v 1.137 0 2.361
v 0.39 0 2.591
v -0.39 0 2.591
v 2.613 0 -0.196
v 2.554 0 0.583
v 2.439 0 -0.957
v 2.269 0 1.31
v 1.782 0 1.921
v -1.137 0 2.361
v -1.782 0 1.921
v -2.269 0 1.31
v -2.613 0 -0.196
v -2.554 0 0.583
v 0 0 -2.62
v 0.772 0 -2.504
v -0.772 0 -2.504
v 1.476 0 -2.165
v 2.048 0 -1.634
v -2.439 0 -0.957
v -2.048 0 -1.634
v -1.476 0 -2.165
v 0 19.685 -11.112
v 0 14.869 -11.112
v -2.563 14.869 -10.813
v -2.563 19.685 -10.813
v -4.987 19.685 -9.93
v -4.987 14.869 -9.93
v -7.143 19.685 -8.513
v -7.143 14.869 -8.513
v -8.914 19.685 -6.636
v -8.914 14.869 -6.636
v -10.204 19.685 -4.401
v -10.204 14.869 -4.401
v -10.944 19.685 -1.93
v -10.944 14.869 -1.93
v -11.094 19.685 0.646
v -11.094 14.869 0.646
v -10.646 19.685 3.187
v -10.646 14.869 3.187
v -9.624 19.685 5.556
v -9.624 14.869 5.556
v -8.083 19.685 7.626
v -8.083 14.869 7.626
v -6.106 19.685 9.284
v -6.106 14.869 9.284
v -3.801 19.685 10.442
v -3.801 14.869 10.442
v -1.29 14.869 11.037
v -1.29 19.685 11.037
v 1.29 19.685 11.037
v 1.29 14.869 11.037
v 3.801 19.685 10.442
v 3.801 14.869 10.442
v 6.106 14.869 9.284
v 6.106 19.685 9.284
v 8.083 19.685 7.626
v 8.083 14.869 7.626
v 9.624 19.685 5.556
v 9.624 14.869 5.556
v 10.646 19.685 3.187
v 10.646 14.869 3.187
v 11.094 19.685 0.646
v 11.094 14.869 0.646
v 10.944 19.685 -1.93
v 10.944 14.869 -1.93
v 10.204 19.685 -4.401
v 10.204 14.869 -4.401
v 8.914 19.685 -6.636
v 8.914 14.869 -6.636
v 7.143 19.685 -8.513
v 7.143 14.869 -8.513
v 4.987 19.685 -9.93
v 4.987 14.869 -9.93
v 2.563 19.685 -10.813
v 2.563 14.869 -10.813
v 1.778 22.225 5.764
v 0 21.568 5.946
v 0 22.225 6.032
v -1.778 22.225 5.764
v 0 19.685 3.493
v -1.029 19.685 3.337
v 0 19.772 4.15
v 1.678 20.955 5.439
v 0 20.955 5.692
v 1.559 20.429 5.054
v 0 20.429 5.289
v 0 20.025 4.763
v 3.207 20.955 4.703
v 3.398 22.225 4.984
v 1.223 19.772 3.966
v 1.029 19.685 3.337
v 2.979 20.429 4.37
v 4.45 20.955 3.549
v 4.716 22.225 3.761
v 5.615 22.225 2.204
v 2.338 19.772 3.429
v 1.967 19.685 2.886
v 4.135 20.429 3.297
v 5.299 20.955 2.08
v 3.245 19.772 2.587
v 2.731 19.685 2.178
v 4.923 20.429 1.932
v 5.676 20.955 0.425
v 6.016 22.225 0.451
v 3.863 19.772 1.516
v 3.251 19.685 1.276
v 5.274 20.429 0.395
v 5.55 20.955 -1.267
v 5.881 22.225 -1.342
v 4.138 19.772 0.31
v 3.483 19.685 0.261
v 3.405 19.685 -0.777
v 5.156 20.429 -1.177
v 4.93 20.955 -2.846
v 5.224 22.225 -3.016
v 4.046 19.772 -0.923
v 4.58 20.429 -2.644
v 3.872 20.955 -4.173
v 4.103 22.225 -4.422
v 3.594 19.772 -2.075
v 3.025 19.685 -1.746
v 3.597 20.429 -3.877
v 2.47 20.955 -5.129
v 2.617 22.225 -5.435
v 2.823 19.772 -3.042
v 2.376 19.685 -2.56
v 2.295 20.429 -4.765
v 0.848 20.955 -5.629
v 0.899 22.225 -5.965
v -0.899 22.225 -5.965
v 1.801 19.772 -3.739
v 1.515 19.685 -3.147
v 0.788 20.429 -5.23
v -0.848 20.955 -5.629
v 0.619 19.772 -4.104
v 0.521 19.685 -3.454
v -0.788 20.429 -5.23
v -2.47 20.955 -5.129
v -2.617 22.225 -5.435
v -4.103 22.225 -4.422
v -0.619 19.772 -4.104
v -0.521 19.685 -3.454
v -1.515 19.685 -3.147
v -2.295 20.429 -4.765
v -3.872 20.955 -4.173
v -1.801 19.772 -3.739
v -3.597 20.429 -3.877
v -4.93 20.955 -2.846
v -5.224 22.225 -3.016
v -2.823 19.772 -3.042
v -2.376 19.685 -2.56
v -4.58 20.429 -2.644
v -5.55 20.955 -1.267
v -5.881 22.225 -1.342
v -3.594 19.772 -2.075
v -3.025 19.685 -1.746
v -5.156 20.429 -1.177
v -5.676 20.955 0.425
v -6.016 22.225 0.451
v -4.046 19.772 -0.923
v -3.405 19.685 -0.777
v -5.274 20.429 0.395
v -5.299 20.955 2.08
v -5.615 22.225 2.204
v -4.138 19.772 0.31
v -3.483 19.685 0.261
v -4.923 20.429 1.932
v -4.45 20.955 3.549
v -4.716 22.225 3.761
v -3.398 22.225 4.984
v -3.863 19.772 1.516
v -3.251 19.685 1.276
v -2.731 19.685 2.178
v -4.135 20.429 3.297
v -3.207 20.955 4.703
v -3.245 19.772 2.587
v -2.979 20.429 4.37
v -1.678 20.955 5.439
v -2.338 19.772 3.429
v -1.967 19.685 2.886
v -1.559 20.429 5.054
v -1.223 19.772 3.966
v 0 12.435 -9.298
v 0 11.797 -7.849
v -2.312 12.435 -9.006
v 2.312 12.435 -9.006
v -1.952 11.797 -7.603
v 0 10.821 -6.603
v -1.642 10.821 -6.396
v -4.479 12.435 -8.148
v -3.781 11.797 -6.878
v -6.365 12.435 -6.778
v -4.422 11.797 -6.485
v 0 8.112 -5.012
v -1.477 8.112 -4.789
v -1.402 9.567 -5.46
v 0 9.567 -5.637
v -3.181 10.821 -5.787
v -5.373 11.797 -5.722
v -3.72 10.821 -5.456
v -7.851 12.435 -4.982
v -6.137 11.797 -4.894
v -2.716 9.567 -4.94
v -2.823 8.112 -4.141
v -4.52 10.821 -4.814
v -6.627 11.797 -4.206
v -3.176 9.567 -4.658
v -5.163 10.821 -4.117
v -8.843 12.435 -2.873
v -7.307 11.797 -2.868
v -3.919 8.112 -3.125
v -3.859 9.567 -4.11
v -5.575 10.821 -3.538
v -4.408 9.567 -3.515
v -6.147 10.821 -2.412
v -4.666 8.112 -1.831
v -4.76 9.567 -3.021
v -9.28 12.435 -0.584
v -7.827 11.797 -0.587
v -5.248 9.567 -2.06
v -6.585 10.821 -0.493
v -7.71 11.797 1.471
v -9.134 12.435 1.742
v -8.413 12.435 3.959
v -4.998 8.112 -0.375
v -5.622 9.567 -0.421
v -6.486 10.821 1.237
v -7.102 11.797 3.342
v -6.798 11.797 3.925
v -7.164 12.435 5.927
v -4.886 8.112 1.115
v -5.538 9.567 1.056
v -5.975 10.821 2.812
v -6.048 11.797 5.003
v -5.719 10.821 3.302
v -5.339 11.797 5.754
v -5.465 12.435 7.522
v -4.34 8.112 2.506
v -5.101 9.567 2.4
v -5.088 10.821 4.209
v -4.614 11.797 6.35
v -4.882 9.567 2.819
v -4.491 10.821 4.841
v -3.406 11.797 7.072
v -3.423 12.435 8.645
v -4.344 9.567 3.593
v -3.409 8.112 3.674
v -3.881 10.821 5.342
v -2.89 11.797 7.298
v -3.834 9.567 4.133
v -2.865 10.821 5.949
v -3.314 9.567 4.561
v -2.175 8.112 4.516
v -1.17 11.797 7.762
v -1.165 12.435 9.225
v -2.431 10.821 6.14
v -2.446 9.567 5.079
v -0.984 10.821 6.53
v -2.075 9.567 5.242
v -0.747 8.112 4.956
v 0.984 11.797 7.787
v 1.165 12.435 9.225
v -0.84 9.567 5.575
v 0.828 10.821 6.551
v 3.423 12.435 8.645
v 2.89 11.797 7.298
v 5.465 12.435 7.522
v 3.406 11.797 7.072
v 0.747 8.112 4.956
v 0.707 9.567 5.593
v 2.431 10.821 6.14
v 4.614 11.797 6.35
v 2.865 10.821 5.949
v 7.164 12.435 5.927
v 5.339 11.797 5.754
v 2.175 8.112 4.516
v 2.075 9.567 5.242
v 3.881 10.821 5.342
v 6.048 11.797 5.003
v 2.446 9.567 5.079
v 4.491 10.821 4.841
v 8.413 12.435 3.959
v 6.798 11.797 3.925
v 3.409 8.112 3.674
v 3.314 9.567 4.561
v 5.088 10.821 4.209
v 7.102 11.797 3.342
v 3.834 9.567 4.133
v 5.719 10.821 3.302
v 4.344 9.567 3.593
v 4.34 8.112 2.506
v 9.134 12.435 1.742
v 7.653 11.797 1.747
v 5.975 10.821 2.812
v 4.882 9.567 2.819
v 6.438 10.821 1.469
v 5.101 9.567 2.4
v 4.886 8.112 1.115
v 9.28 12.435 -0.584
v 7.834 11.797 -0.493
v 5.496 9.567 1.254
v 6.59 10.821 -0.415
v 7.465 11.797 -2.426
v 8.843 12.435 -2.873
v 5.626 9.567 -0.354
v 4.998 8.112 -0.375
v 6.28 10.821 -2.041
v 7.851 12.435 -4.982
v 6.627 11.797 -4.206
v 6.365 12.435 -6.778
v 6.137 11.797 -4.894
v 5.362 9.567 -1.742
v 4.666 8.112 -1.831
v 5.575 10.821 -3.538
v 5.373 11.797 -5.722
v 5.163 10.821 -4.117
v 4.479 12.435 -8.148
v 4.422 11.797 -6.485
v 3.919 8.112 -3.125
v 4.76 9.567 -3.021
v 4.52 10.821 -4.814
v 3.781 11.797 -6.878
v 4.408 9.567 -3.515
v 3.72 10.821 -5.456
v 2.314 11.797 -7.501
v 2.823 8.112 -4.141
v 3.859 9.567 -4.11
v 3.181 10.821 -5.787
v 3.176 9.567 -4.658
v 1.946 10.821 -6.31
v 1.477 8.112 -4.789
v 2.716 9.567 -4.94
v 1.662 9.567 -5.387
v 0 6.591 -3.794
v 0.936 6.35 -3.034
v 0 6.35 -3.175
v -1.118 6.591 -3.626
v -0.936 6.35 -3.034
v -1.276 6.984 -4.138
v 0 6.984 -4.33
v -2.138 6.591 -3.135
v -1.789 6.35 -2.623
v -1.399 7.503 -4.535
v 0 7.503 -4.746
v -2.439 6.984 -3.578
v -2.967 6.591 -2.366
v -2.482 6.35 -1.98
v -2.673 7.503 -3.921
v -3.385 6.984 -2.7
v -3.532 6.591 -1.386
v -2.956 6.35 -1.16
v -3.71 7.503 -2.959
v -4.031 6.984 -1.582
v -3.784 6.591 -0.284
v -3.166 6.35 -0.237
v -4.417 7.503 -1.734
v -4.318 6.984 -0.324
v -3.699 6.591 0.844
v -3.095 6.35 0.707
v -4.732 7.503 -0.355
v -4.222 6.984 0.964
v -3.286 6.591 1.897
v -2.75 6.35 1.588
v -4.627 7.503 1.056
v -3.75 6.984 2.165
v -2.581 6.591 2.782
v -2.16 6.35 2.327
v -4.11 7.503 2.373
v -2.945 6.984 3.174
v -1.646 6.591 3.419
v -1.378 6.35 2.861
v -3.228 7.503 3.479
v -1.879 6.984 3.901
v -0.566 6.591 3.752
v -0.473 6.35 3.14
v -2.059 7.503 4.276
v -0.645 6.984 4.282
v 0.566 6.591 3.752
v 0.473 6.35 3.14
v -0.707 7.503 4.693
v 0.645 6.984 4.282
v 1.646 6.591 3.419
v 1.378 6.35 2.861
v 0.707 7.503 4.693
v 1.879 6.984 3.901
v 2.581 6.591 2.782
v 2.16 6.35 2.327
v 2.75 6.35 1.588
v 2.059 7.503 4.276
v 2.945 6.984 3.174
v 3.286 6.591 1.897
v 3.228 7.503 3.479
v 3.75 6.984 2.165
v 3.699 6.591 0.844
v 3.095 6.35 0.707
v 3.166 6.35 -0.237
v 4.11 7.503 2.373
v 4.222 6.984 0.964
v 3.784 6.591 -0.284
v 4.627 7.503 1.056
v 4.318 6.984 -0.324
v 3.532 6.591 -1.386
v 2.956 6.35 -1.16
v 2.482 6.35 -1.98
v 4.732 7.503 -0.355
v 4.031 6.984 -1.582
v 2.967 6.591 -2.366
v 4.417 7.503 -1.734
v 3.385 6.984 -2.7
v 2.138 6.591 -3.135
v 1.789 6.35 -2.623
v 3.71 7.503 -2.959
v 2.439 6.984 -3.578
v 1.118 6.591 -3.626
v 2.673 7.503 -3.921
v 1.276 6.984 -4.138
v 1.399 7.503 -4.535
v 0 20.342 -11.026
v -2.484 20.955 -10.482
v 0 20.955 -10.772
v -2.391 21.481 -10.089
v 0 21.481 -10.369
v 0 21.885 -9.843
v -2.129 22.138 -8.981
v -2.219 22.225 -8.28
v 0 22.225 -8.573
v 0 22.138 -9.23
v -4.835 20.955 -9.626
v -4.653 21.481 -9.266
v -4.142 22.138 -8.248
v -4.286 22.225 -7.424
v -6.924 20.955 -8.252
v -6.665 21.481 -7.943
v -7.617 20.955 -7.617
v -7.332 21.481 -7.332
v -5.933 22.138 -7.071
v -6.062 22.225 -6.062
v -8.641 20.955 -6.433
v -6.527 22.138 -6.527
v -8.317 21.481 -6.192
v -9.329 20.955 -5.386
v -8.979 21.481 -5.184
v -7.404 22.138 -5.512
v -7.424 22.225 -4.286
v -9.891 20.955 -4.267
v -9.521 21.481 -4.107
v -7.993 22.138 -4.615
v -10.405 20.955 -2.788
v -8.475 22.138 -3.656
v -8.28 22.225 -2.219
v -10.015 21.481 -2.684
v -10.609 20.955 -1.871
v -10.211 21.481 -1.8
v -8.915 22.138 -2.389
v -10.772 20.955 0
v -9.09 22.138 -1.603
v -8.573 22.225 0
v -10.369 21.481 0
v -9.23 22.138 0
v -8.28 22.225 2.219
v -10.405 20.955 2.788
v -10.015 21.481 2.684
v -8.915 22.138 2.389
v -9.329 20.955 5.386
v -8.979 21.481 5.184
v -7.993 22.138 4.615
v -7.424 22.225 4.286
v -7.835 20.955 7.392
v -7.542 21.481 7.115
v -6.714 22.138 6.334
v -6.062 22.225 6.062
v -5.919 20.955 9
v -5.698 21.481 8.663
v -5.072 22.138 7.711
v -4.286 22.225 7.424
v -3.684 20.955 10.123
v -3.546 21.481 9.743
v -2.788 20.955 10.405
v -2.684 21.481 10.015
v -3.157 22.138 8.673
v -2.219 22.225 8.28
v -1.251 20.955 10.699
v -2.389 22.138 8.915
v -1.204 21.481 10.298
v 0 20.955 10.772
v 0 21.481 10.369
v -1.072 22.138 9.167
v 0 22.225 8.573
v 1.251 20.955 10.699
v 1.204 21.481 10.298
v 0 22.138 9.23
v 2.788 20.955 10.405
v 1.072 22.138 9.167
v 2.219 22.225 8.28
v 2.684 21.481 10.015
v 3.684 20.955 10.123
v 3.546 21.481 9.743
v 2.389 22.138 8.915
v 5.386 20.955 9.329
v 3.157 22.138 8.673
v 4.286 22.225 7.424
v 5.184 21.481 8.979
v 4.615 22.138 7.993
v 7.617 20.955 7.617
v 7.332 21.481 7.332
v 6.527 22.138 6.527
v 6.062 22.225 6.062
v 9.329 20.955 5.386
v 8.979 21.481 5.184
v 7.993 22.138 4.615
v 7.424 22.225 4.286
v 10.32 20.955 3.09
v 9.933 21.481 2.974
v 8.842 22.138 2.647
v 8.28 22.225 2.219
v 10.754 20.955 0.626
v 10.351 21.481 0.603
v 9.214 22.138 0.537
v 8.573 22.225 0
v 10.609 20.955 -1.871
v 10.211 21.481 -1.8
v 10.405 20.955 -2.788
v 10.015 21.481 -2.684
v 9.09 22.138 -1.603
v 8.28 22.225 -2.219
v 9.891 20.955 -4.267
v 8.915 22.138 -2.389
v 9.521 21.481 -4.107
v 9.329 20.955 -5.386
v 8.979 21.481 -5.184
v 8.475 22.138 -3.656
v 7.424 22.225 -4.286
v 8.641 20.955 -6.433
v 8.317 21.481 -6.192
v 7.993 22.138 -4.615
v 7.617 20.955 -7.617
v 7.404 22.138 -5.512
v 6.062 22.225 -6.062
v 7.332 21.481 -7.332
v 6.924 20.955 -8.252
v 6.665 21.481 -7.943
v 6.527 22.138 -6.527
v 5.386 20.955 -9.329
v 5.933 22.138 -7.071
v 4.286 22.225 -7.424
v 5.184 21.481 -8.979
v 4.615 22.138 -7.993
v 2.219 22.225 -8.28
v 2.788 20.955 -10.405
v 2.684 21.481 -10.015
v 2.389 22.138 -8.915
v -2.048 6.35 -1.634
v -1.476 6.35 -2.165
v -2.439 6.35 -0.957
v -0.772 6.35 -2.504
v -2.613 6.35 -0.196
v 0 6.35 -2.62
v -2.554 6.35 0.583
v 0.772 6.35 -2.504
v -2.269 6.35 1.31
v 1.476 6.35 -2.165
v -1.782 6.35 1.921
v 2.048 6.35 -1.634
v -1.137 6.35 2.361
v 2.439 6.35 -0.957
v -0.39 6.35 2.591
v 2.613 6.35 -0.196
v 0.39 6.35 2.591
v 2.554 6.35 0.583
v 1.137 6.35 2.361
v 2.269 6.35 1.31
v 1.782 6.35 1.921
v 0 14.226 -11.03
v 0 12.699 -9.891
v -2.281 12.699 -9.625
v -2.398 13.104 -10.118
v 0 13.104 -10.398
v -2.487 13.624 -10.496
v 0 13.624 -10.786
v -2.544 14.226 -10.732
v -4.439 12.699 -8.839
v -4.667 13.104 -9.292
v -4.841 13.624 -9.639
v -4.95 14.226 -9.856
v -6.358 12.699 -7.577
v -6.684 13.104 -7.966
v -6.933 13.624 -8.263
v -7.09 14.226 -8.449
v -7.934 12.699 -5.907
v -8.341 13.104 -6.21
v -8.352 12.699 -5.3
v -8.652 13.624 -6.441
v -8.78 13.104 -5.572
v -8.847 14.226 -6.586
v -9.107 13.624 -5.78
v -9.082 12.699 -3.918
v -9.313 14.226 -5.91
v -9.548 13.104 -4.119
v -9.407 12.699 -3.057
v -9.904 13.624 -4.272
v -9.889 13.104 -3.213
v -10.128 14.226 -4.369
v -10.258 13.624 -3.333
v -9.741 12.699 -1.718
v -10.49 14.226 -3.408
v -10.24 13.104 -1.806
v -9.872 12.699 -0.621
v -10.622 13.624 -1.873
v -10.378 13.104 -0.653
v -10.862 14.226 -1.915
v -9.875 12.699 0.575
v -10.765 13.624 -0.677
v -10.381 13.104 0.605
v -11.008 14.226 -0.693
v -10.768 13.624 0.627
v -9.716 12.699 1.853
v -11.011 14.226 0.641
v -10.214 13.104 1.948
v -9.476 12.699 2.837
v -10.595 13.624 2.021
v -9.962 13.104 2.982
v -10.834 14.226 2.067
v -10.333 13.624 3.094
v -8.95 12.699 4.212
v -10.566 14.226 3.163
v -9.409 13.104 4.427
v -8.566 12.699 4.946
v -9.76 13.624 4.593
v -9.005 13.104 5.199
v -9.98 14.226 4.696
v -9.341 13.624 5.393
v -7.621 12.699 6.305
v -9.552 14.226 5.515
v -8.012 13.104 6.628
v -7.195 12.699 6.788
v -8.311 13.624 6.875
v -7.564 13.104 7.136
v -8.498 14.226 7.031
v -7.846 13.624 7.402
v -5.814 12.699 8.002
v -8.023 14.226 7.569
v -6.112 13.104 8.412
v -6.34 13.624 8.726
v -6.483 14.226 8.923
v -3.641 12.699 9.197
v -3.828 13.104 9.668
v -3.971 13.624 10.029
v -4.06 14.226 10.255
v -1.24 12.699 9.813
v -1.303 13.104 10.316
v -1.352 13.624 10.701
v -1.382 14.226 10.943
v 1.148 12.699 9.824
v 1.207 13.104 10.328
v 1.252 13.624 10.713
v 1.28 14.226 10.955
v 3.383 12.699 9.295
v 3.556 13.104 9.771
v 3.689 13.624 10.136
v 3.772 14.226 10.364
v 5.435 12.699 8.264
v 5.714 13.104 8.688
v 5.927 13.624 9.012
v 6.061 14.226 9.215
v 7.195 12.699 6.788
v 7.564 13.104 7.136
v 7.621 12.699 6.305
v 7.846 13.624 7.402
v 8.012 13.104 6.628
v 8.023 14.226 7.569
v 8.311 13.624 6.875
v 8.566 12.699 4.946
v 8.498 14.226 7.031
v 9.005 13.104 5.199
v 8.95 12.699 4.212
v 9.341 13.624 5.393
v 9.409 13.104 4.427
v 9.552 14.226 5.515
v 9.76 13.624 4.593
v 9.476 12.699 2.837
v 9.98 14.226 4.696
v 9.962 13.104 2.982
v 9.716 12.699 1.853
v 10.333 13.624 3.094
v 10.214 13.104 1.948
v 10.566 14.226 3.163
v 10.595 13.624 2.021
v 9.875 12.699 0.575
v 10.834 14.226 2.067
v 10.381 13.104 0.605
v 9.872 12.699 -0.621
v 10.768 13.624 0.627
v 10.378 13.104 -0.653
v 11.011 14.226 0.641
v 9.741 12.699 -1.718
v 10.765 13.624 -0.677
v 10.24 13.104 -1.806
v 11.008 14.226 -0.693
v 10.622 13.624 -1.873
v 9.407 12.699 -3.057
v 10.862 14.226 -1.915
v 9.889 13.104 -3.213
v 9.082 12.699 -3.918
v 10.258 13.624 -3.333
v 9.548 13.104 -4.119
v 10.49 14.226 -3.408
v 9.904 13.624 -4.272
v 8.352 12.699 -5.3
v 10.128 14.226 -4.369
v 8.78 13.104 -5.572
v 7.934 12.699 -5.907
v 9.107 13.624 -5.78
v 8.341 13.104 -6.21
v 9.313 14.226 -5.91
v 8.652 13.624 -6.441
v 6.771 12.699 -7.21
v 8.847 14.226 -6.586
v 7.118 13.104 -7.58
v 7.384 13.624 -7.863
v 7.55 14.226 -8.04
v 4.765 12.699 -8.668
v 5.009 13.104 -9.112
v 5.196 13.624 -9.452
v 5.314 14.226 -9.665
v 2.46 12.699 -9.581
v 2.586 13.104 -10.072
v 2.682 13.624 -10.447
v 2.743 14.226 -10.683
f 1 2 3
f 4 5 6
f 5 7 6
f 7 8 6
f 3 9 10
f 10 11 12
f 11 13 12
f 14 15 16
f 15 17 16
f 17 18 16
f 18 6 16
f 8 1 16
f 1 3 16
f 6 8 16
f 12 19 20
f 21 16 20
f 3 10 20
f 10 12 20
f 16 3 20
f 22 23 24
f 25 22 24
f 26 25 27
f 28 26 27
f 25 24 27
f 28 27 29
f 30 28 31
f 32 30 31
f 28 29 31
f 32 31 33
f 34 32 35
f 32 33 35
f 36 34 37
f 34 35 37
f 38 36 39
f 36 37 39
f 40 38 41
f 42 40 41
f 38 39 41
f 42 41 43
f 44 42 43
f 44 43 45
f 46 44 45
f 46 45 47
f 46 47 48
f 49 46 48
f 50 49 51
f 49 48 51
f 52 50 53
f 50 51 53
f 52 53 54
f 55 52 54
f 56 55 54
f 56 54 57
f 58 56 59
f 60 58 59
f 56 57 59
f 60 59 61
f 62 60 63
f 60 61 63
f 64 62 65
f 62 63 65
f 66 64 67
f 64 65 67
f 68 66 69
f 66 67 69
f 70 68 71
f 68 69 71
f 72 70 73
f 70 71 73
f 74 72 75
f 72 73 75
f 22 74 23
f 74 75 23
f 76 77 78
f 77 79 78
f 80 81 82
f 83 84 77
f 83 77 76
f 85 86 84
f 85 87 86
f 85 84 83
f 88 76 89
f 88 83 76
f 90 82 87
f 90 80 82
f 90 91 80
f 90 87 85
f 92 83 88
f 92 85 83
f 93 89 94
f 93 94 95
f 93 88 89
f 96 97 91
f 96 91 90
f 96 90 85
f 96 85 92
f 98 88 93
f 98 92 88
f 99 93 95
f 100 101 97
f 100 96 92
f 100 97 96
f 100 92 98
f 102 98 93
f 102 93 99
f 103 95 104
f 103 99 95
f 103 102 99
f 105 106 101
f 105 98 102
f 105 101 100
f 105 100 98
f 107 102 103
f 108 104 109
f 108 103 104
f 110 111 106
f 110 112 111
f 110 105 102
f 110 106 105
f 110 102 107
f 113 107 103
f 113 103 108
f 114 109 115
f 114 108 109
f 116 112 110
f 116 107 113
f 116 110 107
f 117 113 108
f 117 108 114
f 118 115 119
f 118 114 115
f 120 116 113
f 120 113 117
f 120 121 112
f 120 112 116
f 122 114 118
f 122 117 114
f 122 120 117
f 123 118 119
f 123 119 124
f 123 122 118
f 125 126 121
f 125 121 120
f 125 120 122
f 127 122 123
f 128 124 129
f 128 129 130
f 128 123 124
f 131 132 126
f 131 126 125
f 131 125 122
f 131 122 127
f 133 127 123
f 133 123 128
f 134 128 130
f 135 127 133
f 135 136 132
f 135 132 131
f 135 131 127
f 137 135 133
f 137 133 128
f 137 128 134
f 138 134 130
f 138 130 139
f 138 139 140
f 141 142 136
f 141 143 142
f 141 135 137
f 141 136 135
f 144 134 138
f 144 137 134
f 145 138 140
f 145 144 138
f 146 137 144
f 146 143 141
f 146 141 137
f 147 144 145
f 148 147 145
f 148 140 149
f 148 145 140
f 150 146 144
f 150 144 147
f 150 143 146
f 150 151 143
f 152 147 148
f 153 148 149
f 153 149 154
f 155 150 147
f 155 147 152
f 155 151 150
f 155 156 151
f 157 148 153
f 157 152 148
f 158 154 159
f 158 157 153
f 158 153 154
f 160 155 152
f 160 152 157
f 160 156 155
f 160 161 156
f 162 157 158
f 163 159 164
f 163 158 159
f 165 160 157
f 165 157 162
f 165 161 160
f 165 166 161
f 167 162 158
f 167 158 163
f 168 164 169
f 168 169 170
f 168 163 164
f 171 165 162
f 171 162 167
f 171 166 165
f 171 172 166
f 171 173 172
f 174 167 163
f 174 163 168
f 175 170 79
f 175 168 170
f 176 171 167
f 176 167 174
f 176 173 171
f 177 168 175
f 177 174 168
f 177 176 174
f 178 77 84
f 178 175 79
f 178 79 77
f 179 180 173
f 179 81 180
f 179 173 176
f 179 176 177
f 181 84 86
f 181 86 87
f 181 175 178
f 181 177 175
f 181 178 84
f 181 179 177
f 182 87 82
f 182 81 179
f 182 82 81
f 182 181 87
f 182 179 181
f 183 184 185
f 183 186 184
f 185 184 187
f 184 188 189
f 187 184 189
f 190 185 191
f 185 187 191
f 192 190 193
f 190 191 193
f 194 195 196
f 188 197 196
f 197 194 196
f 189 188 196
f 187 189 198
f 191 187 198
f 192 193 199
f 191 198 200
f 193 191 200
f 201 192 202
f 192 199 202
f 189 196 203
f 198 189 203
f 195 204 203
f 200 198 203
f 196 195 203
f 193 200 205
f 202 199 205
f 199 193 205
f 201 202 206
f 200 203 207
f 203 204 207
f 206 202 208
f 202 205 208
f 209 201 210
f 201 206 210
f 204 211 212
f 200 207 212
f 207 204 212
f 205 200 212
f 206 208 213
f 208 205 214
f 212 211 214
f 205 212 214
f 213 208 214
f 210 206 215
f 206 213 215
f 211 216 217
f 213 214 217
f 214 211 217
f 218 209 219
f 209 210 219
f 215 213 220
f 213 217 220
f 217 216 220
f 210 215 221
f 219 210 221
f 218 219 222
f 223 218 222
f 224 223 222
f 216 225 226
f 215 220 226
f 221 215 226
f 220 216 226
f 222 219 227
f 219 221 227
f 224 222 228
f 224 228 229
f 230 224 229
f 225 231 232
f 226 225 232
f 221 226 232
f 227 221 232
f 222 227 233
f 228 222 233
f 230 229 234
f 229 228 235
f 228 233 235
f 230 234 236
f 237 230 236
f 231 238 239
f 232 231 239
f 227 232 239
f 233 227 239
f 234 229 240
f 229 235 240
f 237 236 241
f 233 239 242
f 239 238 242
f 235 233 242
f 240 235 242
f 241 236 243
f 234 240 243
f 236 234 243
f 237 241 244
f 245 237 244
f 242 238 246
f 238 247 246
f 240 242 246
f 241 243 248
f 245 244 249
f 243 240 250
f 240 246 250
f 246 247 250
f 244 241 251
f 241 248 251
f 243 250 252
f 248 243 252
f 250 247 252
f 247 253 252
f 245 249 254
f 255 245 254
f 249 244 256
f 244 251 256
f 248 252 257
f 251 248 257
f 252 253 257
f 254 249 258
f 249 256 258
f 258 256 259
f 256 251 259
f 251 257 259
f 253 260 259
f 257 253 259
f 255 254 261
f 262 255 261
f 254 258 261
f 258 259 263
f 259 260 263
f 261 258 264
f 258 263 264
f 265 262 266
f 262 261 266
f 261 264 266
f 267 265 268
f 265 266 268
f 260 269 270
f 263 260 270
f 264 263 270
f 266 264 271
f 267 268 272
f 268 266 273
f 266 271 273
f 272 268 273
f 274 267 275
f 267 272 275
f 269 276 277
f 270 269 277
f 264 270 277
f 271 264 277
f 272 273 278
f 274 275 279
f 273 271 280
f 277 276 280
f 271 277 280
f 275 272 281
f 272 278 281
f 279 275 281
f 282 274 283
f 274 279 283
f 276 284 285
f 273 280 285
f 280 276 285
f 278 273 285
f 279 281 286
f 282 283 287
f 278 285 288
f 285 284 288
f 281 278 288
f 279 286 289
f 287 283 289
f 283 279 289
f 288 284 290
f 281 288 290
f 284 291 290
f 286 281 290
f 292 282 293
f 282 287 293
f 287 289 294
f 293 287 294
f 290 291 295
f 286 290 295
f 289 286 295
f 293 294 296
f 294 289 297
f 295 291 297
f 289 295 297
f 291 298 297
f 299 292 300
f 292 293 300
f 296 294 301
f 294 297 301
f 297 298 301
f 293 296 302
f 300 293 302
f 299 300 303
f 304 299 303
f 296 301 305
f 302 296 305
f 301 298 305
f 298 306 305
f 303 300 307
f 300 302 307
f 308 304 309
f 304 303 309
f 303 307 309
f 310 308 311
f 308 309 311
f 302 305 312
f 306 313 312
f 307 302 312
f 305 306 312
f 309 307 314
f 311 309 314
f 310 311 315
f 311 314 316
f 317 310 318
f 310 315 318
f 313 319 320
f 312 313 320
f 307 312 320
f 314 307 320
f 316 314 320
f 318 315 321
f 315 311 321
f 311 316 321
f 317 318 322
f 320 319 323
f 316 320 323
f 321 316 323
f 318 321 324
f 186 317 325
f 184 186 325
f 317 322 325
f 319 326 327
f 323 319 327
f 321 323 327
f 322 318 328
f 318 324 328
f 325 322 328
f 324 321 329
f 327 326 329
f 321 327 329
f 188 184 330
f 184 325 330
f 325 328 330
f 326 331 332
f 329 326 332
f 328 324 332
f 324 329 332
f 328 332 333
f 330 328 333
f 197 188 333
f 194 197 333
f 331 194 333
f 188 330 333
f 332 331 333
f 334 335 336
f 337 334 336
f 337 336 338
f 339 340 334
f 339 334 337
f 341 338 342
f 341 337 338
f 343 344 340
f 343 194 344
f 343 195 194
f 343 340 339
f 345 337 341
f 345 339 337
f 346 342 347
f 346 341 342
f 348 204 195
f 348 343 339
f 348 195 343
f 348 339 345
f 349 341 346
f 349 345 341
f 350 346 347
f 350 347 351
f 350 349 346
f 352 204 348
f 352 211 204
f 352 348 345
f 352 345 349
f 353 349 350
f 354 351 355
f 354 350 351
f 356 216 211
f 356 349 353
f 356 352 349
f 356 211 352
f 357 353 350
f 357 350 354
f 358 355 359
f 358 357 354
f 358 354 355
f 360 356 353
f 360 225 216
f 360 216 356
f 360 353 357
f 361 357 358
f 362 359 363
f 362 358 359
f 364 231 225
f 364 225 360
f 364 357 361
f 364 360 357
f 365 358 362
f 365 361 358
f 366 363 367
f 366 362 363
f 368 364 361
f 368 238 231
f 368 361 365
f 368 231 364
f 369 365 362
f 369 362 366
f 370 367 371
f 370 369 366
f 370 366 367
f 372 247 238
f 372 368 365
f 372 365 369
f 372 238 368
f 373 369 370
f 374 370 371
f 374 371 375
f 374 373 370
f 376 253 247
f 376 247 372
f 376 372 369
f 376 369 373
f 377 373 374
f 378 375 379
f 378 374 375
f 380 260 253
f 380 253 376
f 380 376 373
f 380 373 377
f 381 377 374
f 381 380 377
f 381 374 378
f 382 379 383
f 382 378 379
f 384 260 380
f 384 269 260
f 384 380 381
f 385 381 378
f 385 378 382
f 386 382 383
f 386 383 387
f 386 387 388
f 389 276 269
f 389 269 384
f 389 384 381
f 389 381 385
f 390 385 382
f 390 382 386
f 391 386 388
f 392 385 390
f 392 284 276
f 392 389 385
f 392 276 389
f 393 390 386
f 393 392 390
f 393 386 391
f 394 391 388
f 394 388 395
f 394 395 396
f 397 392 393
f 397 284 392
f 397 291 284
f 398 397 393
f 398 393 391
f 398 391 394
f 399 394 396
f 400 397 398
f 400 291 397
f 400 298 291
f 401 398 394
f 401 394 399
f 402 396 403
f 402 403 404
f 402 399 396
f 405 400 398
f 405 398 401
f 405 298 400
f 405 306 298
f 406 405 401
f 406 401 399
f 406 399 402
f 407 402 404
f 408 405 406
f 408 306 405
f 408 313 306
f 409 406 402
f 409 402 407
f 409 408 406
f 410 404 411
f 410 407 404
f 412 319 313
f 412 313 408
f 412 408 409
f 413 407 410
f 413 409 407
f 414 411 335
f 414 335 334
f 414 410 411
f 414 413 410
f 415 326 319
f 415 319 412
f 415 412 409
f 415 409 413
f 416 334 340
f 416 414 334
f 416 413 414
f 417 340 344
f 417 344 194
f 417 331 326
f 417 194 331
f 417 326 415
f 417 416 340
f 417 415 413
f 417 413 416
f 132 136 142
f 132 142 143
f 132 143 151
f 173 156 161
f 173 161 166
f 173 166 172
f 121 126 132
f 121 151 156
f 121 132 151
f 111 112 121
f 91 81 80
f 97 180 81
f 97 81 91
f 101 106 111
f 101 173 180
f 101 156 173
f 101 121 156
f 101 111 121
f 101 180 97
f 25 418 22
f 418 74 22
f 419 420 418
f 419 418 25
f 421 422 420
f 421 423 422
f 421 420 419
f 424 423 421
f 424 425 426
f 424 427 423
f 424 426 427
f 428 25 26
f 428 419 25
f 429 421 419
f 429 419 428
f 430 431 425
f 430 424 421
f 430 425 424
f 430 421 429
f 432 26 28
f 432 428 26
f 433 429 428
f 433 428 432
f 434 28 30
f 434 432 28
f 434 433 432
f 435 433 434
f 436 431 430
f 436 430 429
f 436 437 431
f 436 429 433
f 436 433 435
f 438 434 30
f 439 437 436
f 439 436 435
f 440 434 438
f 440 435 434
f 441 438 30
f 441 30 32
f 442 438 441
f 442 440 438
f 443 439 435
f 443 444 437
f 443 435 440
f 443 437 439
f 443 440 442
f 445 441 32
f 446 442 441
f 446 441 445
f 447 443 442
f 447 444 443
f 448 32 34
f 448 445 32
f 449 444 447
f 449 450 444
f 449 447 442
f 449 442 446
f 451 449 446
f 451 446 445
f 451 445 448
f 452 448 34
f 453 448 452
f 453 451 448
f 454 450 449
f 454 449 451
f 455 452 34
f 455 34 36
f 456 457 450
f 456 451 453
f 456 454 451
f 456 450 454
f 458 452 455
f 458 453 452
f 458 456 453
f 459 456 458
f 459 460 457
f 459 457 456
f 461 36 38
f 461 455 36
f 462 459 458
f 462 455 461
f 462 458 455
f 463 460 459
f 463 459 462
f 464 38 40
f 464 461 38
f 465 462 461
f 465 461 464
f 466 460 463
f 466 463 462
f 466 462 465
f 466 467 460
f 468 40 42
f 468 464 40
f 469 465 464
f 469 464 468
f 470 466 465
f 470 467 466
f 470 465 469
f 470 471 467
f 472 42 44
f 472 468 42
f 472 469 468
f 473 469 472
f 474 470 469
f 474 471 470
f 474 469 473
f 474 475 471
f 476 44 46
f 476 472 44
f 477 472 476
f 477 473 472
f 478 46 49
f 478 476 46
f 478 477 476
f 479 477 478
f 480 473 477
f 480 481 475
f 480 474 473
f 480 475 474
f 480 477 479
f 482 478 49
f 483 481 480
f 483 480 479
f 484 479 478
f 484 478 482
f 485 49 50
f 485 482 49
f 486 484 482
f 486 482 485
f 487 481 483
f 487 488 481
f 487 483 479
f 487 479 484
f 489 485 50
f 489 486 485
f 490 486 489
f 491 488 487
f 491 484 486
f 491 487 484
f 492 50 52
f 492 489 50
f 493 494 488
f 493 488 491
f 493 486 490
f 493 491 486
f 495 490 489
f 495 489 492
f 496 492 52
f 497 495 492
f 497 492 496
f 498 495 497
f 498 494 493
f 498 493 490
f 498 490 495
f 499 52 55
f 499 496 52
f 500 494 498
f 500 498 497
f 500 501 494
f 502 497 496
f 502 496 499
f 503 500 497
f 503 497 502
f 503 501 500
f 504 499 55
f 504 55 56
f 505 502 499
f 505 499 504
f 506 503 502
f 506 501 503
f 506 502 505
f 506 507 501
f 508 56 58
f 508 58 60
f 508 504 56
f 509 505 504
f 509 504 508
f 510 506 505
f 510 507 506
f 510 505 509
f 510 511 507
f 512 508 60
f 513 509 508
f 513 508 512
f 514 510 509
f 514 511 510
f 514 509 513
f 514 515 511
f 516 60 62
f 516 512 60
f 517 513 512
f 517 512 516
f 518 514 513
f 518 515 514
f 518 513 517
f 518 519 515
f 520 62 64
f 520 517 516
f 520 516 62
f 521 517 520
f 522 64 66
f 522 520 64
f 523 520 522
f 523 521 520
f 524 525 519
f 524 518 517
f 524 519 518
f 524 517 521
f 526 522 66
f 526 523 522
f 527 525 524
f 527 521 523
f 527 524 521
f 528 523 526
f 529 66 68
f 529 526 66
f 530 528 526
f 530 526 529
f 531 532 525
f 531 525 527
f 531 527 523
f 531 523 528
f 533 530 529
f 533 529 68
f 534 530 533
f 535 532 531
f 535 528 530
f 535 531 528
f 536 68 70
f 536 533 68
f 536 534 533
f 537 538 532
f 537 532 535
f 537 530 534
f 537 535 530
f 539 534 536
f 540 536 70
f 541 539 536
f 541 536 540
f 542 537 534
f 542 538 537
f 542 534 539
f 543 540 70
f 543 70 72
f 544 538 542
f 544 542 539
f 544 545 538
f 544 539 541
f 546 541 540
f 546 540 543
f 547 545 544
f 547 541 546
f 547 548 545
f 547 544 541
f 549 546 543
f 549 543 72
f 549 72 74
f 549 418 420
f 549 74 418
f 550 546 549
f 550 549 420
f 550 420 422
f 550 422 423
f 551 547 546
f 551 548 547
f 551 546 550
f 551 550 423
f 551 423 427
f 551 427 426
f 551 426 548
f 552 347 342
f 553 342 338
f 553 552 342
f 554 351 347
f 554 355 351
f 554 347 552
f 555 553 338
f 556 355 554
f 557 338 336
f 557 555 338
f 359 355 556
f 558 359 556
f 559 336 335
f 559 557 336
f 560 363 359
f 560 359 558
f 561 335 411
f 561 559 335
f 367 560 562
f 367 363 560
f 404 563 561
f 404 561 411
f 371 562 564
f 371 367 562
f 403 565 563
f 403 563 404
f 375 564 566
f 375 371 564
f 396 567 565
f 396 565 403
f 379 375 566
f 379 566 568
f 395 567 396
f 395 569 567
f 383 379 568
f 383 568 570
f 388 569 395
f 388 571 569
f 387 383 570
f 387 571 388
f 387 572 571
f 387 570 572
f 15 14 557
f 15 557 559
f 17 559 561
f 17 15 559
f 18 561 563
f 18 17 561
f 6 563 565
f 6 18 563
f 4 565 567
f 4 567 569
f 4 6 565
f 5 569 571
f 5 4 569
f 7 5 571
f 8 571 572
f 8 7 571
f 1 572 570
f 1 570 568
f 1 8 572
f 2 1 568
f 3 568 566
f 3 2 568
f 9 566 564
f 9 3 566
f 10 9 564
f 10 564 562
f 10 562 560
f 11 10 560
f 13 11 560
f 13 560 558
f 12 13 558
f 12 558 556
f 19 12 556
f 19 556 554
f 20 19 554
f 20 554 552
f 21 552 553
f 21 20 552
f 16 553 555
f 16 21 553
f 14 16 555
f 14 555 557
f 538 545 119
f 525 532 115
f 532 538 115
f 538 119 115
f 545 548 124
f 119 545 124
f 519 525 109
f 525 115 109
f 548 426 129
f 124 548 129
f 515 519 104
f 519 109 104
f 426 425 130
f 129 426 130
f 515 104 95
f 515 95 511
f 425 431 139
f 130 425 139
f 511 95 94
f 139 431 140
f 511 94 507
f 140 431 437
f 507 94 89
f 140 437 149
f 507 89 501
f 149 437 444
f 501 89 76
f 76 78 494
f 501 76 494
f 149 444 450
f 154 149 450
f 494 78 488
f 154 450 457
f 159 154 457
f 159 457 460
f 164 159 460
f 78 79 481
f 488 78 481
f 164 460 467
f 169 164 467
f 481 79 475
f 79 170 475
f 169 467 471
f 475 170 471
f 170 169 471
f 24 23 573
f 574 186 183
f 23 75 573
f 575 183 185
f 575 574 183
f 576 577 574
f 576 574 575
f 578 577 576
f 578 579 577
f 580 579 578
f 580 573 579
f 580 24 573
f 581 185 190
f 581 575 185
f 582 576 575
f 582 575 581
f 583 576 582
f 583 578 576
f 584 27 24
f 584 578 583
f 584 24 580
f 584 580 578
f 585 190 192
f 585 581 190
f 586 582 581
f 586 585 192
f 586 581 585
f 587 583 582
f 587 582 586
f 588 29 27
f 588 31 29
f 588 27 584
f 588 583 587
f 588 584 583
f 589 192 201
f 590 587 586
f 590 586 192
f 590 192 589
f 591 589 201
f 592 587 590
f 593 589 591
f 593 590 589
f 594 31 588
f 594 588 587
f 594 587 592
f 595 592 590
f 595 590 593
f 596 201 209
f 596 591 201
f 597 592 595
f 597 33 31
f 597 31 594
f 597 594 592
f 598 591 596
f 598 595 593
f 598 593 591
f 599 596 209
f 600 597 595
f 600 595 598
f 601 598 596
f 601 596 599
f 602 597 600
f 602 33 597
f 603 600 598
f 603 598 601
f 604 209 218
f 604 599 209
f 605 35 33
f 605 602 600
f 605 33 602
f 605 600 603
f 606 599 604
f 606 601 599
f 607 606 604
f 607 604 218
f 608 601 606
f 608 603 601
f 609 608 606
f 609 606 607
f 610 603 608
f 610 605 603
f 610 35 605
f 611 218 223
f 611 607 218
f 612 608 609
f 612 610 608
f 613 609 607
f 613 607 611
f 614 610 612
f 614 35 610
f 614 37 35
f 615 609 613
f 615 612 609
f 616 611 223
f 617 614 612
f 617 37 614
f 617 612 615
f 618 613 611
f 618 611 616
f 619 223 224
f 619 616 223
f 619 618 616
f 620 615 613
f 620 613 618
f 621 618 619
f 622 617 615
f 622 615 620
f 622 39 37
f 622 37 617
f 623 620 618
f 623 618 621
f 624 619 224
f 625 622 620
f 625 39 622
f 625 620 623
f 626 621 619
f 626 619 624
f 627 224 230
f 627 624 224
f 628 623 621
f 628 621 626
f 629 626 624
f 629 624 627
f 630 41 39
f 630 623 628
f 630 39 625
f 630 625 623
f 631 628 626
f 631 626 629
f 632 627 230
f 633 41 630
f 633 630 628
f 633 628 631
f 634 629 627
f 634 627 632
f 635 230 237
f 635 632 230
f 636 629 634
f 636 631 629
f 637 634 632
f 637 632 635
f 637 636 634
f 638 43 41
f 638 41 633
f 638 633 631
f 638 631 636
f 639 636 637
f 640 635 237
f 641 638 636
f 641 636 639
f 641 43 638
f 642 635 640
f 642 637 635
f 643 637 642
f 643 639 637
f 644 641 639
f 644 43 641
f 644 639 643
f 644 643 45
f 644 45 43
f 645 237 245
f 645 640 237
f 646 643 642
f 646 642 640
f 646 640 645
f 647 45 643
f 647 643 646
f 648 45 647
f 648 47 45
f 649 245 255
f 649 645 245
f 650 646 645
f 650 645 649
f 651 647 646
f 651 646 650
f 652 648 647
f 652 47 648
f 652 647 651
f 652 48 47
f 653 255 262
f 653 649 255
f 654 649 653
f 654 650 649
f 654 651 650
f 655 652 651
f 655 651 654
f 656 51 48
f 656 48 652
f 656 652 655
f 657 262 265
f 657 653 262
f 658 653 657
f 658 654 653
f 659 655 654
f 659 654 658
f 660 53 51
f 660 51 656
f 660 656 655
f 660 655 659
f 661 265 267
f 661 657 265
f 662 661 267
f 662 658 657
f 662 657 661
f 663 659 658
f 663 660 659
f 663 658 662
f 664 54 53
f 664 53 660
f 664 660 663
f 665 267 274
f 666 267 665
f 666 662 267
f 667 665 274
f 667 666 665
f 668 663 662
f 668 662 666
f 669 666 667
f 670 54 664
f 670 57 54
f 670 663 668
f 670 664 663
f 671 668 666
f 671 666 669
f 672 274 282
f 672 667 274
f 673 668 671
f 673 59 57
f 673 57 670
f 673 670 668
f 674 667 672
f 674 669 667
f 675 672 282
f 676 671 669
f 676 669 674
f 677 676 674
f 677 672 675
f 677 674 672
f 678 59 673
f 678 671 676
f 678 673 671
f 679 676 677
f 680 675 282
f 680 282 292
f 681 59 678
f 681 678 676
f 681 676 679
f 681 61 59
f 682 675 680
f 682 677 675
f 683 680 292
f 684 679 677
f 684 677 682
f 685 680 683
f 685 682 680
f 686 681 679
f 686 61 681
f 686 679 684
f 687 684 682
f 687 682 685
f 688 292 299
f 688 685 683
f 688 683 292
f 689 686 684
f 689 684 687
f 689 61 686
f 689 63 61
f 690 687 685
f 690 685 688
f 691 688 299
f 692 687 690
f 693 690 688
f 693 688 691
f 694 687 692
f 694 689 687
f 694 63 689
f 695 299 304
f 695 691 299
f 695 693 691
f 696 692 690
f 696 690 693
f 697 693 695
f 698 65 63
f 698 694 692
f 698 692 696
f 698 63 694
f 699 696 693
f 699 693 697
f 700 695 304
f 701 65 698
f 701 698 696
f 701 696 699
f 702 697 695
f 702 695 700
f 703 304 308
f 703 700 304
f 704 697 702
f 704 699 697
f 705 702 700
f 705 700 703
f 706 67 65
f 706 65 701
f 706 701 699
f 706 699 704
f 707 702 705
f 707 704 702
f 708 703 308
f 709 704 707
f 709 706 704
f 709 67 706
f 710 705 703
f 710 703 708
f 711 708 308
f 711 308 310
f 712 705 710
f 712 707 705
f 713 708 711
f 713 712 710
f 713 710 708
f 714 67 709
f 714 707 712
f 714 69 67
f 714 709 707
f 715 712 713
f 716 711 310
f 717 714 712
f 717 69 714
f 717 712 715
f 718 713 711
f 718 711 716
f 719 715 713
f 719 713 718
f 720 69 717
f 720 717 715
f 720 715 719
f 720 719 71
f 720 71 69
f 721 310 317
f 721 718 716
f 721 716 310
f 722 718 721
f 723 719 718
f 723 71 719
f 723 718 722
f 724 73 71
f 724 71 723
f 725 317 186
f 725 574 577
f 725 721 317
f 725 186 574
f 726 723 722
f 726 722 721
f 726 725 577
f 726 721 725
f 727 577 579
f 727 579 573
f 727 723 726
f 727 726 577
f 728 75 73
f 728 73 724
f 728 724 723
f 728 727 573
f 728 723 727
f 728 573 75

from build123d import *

# Parameters (mm, degrees)
FILLET1_R          = 2.54
SKETCH2_R          = 6.0325
CUT_EXTRUDE1_DEPTH = 2.54
FILLET2_R          = 2.54
SKETCH4_OUTSIDE_W  = 31.924
SKETCH4_OUTSIDE_H  = 31.924
SKETCH4_OUTSIDE_R  = 2.62
CUT_EXTRUDE2_DEPTH = 6.35


# Some blends are built 0.0001 mm under size
with BuildPart() as part:
    # Sketch1 → Base-Revolve (revolve)
    with BuildSketch(Plane.XY, mode=Mode.PRIVATE) as base_revolve_sk:
        with BuildLine():
            ThreePointArc((11.1125, 12.7), (6.622371939, 10.840128061), (4.7625, 6.35))
            Line((4.7625, 6.35), (3.175, 6.35))
            Line((3.175, 6.35), (3.175, 0))
            Line((3.175, 0), (0, 0))
            Line((0, 0), (0, 22.225))
            Line((0, 22.225), (11.1125, 22.225))
            Line((11.1125, 22.225), (11.1125, 12.7))
        make_face()
    revolve(base_revolve_sk.sketch.rotate(Axis((0, 0, 0), (0, 1, 0)), 90), axis=Axis((0, 0, 0), (0, 1, 0)))

    # Fillet1
    # the kernel refuses this fillet: 2.54 mm, written as the material it takes off along each edge
    with BuildSketch(Plane(origin=(0, 6.35, 0), x_dir=(0, 0, -1), z_dir=(1, 0, 0))) as fillet1_piece_1:
        with BuildLine():
            CenterArc((2.57175, 2.467324348), FILLET1_R, 283.739035174, 60.14756783)
            Line((3.175, 0), (3.187065, -0.049346487))
            ThreePointArc((3.187065, -0.049346487), (3.96875, -0.0508), (4.7625, -0.0508))
            Line((4.7625, -0.0508), (4.8133, 0))
            ThreePointArc((4.8133, 0), (4.875473976, 0.882851637), (5.060768571, 1.748275538))
            Line((5.060768571, 1.748275538), (5.011964286, 1.762374534))
        make_face()
    revolve(axis=Axis((0, 6.35, 0), (0, 1, 0)), mode=Mode.SUBTRACT)
    with BuildSketch(Plane(origin=(0, 22.225, 0), x_dir=(0, 0, -1), z_dir=(1, 0, 0))) as fillet1_piece_2:
        with BuildLine():
            CenterArc((11.1125 - FILLET1_R, -FILLET1_R), FILLET1_R, 0, 90)
            Line((11.1125, -FILLET1_R), (11.1125 + FILLET1_R * 0.02, -FILLET1_R))
            Line((11.1125 + FILLET1_R * 0.02, -FILLET1_R), (11.1125 + FILLET1_R * 0.02, FILLET1_R * 0.02))
            Line((11.1125 + FILLET1_R * 0.02, FILLET1_R * 0.02), (11.1125 - FILLET1_R, FILLET1_R * 0.02))
            Line((11.1125 - FILLET1_R, FILLET1_R * 0.02), (11.1125 - FILLET1_R, 0))
        make_face()
    revolve(axis=Axis((0, 22.225, 0), (0, 1, 0)), mode=Mode.SUBTRACT)
    with BuildSketch(Plane(origin=(0, 12.7, 0), x_dir=(0, 0, -1), z_dir=(1, 0, 0))) as fillet1_piece_3:
        with BuildLine():
            CenterArc((8.5725, 2.169418994), FILLET1_R, 286.601549599, 73.398450401)
            Line((11.1125, 2.169418994), (11.1633, 2.169418994))
            Line((11.1633, 2.169418994), (11.1633, 0))
            Line((11.1633, 0), (11.1125, -0.0508))
            ThreePointArc((11.1125, -0.0508), (10.203087128, -0.116791447), (9.312728571, -0.313383113))
            Line((9.312728571, -0.313383113), (9.298214286, -0.264700718))
        make_face()
    revolve(axis=Axis((0, 12.7, 0), (0, 1, 0)), mode=Mode.SUBTRACT)

    # Sketch2 → Cut-Extrude1 (cut)
    with BuildSketch(Plane(origin=(0, 22.225, 0), x_dir=(1, 0, 0), z_dir=(0, 1, 0))):
        with Locations(Location((0, 0, 0), (0, 0, 270))):
            Circle(SKETCH2_R)
    extrude(amount=-CUT_EXTRUDE1_DEPTH, mode=Mode.SUBTRACT)

    # Fillet2
    fillet2_edges = [part.edges().sort_by_distance(p)[0] for p in [
        (0, 19.685, -6.0325),
    ]]
    fillet(fillet2_edges, radius=FILLET2_R - 0.0001)  # a hair under: the kernel refuses the full size

    # Sketch4 outside → Cut-Extrude2 (cut)
    with BuildSketch(Plane.XZ):
        Rectangle(SKETCH4_OUTSIDE_W, SKETCH4_OUTSIDE_H)
        with Locations(Location((0, 0, 0), (0, 0, 270))):
            Circle(SKETCH4_OUTSIDE_R, mode=Mode.SUBTRACT)
    extrude(amount=-CUT_EXTRUDE2_DEPTH, mode=Mode.SUBTRACT)


solid = part.part
